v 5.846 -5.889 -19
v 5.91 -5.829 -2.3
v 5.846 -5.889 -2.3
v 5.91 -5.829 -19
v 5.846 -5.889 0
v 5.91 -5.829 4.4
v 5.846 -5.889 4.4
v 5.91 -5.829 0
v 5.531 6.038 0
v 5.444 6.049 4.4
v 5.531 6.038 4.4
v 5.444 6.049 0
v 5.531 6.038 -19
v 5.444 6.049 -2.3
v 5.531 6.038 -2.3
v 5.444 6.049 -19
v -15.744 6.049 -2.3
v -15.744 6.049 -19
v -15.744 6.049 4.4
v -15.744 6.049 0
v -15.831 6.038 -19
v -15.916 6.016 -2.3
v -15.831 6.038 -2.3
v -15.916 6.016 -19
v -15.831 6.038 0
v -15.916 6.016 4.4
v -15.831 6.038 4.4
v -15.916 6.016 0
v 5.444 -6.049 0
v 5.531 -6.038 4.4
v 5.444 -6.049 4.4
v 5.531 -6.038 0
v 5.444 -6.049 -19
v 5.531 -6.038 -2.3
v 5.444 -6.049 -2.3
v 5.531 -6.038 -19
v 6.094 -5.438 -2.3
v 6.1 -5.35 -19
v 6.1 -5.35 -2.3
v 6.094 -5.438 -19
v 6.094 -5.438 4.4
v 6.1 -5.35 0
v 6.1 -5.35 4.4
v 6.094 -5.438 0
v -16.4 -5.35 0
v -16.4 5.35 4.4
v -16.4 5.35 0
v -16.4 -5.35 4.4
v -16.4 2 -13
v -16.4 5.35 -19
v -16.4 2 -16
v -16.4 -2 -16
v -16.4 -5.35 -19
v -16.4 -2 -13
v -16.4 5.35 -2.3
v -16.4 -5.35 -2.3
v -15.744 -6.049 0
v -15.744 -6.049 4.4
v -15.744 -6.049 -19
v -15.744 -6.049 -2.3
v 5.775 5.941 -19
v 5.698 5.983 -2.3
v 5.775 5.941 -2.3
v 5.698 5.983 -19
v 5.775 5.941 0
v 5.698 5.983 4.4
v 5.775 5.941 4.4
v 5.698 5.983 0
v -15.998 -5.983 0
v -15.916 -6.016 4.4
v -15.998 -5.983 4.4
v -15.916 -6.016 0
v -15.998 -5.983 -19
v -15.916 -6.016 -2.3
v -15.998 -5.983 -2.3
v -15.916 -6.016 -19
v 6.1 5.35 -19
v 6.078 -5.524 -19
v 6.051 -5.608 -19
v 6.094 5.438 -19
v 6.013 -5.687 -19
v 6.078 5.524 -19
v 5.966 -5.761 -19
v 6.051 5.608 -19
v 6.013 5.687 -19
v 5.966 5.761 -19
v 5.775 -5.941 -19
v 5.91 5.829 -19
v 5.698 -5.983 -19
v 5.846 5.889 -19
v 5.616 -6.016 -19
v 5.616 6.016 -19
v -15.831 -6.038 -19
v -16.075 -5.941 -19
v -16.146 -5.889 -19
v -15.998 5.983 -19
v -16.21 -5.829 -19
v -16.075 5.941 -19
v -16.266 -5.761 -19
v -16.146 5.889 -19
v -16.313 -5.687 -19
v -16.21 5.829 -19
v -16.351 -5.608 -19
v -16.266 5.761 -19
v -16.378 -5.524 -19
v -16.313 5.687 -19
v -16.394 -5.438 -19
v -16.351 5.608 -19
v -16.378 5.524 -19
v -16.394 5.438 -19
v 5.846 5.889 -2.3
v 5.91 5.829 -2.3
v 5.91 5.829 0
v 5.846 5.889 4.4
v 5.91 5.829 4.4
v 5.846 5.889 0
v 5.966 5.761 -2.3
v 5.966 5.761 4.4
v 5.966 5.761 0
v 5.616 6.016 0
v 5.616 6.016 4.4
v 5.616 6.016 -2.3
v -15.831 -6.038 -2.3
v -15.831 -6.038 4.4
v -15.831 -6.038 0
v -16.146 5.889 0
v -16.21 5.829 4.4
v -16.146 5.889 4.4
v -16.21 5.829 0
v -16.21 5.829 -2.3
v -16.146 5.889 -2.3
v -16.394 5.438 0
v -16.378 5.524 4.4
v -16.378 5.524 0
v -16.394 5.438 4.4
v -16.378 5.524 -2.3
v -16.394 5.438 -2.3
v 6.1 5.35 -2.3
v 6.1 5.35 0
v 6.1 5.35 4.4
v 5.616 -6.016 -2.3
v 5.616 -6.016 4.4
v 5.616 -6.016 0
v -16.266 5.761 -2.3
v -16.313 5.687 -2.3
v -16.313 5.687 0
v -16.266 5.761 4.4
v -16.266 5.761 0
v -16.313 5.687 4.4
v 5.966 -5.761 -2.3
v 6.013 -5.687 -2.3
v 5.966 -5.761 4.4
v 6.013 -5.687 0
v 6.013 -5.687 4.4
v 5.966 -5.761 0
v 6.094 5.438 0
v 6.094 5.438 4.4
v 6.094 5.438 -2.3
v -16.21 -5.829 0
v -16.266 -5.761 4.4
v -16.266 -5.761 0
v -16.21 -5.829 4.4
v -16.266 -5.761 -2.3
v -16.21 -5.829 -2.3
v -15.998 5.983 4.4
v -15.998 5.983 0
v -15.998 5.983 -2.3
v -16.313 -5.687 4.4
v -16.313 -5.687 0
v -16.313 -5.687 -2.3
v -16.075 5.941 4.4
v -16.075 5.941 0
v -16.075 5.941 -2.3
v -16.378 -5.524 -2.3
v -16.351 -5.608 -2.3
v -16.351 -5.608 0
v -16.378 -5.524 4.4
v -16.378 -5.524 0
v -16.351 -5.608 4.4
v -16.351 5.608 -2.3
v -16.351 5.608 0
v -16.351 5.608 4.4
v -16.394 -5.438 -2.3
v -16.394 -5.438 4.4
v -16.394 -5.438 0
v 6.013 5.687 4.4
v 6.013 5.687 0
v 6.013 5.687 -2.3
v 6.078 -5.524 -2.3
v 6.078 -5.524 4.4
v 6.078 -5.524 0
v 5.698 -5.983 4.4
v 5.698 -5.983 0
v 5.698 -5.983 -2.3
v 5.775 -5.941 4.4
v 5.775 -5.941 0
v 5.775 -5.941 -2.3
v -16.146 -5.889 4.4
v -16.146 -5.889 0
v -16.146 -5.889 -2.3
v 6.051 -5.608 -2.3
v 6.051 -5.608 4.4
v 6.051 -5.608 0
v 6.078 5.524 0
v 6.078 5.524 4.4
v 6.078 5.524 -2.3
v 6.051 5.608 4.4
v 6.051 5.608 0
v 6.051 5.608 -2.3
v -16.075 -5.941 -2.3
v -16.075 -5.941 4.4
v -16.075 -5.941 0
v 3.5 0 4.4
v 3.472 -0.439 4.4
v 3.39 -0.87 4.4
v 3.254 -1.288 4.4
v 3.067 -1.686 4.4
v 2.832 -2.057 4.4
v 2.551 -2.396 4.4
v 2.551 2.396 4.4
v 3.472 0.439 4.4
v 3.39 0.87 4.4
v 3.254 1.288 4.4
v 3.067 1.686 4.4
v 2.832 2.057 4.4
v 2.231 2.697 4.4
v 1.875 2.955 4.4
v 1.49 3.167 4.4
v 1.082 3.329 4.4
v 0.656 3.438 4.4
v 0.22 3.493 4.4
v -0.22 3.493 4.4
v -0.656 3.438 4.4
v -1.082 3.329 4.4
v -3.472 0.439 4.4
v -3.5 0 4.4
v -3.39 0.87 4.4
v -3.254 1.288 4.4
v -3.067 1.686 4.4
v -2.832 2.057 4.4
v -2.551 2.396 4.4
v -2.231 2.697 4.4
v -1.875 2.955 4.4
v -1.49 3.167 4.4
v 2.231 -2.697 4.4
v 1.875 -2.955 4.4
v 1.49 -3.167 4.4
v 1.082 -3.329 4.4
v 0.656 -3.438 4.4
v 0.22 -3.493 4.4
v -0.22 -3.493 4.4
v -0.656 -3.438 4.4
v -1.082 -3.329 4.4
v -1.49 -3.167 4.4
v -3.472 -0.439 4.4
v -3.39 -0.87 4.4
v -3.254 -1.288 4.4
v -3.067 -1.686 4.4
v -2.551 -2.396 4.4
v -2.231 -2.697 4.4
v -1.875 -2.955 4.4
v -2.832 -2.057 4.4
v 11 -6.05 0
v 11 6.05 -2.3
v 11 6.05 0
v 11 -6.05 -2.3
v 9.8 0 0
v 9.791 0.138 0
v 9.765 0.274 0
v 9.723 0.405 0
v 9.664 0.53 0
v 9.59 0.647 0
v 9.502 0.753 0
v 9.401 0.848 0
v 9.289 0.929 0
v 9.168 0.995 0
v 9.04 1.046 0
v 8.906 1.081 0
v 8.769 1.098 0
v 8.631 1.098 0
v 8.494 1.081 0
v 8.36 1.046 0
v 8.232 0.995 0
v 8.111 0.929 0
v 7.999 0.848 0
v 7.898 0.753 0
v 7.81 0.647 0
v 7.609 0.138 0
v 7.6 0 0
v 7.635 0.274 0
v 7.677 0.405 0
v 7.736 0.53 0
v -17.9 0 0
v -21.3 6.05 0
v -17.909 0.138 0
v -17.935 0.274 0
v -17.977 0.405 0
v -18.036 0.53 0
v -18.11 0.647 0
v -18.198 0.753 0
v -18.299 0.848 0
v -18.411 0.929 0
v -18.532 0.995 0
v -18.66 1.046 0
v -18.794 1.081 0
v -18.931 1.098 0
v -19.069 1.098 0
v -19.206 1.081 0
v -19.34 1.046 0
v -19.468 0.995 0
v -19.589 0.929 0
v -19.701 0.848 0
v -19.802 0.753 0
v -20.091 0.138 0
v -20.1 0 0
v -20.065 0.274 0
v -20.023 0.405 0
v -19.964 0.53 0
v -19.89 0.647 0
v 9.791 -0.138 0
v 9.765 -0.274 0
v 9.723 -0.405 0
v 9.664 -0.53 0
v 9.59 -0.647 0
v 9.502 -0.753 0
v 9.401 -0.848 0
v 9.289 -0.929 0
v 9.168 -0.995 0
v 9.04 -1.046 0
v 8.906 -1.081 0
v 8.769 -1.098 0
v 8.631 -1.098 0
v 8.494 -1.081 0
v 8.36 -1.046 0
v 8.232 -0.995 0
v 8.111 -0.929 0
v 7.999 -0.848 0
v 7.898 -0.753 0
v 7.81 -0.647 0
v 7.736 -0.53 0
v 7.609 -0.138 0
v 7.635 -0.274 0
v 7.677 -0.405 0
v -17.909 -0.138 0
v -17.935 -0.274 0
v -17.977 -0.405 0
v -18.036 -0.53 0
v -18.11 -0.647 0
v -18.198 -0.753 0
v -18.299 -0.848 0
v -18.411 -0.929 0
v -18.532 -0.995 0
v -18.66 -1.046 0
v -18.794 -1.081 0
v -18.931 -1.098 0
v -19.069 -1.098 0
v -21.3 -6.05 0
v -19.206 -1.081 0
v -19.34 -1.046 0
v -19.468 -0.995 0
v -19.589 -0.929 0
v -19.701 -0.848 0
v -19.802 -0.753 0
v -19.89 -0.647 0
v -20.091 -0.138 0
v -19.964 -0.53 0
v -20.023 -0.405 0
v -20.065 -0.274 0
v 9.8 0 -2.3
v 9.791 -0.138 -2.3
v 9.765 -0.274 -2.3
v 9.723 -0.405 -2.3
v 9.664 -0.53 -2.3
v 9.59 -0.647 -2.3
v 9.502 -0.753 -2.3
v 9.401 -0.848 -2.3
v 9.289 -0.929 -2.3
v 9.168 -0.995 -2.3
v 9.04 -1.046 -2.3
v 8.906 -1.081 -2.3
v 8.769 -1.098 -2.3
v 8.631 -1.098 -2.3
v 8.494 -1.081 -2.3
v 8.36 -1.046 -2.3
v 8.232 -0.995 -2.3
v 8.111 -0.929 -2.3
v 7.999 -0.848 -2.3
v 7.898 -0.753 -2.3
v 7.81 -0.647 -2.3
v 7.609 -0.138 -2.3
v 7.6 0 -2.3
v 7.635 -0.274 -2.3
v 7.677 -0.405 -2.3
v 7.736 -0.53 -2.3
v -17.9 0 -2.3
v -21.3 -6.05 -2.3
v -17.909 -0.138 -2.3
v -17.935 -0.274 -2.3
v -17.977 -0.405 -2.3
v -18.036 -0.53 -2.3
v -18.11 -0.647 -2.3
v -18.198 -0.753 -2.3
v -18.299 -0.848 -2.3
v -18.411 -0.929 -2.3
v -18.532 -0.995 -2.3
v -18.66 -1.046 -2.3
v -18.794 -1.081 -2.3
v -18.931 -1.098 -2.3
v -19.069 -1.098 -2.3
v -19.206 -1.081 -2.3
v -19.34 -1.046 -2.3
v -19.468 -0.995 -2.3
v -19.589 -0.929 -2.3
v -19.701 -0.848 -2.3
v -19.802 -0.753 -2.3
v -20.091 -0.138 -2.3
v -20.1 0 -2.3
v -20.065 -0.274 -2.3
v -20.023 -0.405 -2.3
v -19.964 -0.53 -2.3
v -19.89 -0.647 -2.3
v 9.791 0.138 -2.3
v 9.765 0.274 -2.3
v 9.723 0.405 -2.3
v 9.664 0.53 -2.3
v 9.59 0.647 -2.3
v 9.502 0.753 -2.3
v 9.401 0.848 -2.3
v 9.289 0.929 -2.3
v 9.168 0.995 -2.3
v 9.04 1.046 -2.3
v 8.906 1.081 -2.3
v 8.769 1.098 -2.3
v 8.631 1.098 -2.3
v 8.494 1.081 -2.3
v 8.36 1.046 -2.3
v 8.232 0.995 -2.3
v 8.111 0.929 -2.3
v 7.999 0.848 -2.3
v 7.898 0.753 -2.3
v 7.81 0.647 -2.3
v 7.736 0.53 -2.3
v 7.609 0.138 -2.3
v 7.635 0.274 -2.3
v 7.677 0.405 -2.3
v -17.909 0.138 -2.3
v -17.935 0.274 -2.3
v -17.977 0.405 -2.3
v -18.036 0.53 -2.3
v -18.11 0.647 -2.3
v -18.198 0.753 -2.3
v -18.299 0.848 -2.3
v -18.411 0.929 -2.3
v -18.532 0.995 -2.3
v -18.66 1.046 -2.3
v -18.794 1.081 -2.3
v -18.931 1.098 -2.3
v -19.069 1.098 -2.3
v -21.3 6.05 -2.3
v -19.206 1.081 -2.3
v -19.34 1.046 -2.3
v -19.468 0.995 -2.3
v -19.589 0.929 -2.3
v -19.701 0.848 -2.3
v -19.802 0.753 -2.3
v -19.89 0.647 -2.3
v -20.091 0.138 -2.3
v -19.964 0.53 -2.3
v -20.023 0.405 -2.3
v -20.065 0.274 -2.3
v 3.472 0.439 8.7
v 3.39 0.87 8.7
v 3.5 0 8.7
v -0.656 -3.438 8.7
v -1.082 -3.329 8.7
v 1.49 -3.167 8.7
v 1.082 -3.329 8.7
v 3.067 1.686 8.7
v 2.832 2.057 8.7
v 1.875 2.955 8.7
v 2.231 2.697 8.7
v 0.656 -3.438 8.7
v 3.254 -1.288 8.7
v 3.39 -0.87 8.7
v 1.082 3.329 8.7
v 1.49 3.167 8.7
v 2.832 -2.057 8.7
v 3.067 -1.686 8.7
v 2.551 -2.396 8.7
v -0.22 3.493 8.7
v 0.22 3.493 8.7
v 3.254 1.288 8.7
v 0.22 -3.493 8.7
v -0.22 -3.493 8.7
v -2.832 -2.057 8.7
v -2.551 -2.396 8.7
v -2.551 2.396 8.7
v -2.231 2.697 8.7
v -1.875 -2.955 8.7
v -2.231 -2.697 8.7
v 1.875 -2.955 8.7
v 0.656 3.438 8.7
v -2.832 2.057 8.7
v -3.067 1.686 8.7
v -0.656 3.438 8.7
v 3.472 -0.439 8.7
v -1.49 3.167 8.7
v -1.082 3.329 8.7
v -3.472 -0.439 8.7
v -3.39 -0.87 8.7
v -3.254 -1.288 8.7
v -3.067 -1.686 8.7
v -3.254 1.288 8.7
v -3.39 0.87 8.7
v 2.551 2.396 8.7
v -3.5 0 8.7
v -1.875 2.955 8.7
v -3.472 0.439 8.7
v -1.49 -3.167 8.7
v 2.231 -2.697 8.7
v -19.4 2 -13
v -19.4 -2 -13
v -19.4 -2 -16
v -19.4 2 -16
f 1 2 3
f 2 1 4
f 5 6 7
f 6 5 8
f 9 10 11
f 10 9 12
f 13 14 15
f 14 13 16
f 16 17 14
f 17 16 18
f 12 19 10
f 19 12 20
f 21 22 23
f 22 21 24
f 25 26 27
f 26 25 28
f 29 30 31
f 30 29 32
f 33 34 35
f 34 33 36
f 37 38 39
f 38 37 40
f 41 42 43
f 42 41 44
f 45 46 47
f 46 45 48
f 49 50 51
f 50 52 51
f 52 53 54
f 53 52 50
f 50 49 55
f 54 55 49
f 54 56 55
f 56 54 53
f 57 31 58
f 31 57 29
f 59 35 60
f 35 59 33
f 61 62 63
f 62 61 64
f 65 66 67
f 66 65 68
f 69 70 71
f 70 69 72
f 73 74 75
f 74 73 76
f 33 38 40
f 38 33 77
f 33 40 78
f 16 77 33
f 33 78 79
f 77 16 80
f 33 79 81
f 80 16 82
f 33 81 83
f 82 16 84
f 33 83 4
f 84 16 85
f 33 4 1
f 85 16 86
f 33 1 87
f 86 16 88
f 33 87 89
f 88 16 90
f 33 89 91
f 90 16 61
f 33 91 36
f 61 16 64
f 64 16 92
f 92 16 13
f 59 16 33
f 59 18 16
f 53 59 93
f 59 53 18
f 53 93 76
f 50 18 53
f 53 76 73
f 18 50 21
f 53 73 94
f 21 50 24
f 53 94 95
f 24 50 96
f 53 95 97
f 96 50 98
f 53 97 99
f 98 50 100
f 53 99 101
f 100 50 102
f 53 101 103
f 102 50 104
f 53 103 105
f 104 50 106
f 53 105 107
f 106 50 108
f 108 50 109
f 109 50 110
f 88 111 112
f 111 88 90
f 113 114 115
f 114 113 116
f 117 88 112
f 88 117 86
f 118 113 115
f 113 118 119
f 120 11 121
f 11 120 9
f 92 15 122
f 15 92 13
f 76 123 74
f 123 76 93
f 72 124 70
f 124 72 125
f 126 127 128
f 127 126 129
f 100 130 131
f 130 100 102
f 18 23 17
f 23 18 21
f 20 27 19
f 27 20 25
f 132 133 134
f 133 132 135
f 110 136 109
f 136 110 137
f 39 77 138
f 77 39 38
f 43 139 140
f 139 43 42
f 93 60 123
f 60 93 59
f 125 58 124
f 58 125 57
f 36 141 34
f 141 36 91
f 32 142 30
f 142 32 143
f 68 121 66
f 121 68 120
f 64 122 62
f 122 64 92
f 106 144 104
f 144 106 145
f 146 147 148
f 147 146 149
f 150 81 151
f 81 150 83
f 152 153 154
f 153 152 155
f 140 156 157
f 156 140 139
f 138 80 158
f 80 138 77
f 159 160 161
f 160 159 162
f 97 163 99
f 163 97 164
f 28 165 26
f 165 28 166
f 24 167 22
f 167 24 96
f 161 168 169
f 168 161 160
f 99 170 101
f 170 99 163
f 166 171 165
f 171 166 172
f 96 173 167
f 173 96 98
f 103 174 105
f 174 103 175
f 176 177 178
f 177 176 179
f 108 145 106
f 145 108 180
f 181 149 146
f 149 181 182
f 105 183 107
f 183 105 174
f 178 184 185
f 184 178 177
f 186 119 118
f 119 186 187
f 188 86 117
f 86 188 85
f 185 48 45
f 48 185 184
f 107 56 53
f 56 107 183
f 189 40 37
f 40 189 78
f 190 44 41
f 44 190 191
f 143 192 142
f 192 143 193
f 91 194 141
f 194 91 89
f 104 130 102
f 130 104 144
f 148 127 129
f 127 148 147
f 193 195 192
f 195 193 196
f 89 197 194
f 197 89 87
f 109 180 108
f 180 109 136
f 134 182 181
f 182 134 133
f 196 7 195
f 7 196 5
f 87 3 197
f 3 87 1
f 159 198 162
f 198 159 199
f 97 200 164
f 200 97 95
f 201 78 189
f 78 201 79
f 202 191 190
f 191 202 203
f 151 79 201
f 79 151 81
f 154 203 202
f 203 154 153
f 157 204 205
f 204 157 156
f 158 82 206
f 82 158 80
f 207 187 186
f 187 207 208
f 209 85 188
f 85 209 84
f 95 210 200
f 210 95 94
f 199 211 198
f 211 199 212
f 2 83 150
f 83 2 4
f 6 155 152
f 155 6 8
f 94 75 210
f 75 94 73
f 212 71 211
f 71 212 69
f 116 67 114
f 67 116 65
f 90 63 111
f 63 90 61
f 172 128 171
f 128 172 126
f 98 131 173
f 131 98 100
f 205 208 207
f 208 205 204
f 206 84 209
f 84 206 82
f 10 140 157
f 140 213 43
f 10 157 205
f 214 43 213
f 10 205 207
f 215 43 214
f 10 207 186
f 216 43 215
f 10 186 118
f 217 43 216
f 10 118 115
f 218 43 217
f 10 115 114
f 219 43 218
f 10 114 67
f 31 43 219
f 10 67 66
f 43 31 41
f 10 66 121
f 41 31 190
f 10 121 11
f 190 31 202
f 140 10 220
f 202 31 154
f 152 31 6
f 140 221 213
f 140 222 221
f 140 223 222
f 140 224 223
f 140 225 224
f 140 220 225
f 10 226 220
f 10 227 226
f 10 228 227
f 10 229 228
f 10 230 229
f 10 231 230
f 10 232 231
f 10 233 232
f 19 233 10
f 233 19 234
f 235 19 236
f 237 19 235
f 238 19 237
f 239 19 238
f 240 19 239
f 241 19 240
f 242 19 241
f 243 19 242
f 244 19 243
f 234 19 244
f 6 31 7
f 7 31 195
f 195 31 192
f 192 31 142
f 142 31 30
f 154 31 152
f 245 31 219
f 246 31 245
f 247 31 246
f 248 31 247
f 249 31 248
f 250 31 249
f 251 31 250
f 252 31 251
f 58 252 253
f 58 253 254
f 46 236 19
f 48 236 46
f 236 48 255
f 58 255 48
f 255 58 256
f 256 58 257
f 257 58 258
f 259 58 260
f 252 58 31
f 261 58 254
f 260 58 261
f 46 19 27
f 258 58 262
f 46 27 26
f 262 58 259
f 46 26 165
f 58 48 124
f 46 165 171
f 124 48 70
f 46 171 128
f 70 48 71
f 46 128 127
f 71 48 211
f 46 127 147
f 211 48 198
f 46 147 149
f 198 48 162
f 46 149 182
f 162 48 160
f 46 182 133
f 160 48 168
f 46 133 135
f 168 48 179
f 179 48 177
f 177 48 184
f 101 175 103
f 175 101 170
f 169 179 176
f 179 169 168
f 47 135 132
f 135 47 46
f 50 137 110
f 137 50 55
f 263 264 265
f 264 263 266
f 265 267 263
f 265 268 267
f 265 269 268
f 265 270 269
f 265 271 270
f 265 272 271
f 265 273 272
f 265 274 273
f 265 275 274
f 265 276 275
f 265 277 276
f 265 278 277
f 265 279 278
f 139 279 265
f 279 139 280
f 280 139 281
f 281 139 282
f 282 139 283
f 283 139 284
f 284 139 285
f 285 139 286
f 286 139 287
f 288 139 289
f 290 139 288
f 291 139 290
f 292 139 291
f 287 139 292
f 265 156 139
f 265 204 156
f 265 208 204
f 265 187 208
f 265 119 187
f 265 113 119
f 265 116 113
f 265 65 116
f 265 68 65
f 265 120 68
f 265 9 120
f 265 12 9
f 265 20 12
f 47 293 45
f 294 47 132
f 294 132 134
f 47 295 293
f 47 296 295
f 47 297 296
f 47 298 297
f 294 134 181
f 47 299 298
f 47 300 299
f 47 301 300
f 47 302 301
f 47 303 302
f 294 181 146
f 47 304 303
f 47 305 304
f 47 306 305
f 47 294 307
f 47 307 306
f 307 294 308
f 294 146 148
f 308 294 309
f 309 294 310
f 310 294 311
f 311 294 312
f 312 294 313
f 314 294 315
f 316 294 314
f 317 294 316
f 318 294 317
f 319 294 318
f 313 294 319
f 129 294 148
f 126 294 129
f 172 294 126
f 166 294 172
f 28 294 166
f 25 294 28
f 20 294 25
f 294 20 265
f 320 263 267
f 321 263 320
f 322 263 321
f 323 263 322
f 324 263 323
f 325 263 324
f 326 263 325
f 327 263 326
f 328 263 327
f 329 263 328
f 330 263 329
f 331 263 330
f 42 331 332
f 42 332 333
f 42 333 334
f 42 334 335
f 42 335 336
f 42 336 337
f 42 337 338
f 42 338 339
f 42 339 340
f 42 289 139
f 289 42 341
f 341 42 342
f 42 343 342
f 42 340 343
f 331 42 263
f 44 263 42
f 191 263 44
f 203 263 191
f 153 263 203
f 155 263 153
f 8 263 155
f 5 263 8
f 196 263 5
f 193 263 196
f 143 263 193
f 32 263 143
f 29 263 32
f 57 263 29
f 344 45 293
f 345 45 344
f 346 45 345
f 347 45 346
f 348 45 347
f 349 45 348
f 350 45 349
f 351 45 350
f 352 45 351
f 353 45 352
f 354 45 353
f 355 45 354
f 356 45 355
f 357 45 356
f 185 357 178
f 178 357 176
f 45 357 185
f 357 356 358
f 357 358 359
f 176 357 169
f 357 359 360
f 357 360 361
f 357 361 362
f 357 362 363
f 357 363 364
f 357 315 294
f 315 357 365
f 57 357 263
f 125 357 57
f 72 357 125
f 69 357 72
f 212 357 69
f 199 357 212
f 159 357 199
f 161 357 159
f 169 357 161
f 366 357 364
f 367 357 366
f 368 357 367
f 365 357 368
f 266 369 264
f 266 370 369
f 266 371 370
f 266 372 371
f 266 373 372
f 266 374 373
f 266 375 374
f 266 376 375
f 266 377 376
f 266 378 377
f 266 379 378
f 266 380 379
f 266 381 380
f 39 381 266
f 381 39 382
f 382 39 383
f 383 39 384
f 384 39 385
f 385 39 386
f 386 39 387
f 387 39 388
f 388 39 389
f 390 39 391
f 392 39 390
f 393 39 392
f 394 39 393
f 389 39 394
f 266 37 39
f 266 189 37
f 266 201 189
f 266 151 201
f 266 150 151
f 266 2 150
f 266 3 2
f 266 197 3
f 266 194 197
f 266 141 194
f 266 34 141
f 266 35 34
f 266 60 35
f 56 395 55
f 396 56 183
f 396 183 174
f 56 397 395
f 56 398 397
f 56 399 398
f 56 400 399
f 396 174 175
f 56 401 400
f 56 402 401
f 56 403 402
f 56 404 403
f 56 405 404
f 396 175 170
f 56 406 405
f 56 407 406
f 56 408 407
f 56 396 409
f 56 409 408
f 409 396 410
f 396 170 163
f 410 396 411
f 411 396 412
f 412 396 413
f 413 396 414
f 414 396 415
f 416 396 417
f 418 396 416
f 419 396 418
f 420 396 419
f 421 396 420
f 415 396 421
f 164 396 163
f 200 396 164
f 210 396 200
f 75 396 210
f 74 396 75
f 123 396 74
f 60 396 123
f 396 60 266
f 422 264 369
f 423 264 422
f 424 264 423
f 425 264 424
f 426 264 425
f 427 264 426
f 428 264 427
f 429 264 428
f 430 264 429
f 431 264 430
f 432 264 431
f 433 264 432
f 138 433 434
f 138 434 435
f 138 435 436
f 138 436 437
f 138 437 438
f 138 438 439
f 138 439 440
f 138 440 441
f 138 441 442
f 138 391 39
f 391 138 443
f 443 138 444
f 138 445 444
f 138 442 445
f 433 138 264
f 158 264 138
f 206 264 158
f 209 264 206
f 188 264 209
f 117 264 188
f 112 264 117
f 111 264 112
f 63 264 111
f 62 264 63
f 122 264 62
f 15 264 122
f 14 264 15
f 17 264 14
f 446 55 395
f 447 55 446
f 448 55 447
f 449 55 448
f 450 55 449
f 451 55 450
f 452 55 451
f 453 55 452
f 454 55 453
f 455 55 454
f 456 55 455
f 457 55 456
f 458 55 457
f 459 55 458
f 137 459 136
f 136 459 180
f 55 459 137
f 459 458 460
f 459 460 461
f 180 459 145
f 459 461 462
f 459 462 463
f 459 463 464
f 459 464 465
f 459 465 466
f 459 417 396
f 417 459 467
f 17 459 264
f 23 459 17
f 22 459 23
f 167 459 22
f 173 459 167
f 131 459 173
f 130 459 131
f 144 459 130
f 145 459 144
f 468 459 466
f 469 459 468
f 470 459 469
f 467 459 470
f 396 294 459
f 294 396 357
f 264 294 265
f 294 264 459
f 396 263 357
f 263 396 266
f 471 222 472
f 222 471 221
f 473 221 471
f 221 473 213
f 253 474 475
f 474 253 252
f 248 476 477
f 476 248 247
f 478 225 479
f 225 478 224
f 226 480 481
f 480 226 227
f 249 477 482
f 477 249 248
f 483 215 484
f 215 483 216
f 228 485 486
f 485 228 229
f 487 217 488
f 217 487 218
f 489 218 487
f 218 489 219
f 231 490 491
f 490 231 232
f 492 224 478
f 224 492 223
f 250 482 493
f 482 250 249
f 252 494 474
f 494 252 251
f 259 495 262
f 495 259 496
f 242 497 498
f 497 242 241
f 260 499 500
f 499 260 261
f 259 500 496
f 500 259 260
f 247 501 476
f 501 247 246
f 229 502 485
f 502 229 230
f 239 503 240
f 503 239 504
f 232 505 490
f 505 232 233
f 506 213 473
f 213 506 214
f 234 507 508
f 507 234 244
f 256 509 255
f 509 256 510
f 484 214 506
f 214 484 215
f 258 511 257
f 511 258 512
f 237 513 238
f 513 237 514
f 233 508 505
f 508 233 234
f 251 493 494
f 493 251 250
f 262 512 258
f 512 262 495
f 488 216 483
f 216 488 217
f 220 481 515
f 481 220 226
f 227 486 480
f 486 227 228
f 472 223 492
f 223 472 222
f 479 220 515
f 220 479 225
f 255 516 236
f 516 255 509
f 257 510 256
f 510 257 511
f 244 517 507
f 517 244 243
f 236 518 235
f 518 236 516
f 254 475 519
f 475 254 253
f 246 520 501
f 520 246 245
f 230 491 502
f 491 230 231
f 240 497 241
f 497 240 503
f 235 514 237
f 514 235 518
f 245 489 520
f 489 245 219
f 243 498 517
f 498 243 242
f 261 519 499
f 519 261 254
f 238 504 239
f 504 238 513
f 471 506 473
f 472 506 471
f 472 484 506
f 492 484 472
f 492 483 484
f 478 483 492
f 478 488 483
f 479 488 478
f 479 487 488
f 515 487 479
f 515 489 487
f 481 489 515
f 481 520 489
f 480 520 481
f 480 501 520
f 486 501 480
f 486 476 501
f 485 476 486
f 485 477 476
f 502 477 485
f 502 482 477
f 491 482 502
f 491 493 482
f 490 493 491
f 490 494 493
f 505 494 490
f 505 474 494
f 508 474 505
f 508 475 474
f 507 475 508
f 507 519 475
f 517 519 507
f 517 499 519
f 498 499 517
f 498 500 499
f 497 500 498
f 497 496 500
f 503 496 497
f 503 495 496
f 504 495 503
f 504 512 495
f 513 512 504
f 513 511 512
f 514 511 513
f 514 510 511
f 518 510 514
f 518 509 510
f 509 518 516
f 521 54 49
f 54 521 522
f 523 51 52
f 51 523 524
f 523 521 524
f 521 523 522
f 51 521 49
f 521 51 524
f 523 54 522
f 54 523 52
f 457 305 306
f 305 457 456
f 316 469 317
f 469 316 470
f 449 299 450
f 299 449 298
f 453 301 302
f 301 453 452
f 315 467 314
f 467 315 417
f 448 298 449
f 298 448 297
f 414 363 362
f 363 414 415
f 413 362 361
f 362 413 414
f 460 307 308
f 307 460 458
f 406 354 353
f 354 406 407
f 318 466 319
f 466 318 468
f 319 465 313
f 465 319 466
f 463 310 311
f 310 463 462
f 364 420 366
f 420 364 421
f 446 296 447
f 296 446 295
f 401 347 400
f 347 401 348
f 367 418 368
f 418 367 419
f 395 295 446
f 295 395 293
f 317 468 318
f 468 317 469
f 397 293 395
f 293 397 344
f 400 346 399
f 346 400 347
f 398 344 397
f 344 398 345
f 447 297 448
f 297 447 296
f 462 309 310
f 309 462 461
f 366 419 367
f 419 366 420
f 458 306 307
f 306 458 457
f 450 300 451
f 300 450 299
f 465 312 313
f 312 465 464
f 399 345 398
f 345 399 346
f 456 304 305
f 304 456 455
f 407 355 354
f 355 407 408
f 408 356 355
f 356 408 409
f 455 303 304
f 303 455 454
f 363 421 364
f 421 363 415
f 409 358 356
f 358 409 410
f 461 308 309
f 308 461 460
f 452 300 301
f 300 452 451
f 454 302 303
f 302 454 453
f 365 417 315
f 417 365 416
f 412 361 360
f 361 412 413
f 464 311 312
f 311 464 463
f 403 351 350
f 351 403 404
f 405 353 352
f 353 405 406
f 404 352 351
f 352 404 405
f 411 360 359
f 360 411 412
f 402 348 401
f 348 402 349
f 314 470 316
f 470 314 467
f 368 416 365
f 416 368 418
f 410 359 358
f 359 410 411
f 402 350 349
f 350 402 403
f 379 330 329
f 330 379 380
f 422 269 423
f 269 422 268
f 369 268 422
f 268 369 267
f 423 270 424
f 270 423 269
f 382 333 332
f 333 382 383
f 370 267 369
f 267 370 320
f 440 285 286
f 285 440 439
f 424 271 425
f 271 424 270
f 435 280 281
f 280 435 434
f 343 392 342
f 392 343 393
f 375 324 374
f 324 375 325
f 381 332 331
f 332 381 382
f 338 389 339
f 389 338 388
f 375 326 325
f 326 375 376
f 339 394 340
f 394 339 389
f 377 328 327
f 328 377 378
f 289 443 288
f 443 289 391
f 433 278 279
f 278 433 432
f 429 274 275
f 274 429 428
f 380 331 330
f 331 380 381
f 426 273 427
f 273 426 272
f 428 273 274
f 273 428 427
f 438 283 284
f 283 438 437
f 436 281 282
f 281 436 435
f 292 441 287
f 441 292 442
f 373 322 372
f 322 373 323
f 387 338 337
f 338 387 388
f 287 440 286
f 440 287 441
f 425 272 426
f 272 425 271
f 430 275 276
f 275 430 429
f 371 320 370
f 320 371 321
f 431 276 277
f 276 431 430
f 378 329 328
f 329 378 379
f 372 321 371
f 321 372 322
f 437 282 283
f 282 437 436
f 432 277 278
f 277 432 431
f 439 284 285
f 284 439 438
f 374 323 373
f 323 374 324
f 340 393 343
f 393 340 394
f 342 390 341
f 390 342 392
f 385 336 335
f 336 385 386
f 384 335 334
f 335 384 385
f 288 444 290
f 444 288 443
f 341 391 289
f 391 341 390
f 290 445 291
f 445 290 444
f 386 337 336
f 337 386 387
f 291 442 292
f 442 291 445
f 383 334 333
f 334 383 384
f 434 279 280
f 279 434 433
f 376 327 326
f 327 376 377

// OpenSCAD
$fn = 50;

difference() {
	union() {
		translate(v = [-5.15, 0, -19.0]) {
			hull() {
				translate(v = [-10.55, 5.35, 0]) {
					cylinder(h = 23.4, r = 0.7);
				}
				translate(v = [10.55, 5.35, 0]) {
					cylinder(h = 23.4, r = 0.7);
				}
				translate(v = [-10.55, -5.35, 0]) {
					cylinder(h = 23.4, r = 0.7);
				}
				translate(v = [10.55, -5.35, 0]) {
					cylinder(h = 23.4, r = 0.7);
				}
			}
		}
		translate(v = [-21.299999999999997, -6.05, -2.3]) {
			cube(size = [32.3, 12.1, 2.3]);
		}
		translate(v = [0, 0, 4.4]) {
			cylinder(h = 4.299999999999999, r = 3.5);
		}
		translate(v = [-19.4, -2.0, -16.0]) {
			cube(size = [4, 4, 3]);
		}
	}
	union() {
		translate(v = [-19.0, 0, -4]) {
			cylinder(h = 5, r = 1.1);
		}
		translate(v = [8.7, 0, -4]) {
			cylinder(h = 5, r = 1.1);
		}
	}
}
